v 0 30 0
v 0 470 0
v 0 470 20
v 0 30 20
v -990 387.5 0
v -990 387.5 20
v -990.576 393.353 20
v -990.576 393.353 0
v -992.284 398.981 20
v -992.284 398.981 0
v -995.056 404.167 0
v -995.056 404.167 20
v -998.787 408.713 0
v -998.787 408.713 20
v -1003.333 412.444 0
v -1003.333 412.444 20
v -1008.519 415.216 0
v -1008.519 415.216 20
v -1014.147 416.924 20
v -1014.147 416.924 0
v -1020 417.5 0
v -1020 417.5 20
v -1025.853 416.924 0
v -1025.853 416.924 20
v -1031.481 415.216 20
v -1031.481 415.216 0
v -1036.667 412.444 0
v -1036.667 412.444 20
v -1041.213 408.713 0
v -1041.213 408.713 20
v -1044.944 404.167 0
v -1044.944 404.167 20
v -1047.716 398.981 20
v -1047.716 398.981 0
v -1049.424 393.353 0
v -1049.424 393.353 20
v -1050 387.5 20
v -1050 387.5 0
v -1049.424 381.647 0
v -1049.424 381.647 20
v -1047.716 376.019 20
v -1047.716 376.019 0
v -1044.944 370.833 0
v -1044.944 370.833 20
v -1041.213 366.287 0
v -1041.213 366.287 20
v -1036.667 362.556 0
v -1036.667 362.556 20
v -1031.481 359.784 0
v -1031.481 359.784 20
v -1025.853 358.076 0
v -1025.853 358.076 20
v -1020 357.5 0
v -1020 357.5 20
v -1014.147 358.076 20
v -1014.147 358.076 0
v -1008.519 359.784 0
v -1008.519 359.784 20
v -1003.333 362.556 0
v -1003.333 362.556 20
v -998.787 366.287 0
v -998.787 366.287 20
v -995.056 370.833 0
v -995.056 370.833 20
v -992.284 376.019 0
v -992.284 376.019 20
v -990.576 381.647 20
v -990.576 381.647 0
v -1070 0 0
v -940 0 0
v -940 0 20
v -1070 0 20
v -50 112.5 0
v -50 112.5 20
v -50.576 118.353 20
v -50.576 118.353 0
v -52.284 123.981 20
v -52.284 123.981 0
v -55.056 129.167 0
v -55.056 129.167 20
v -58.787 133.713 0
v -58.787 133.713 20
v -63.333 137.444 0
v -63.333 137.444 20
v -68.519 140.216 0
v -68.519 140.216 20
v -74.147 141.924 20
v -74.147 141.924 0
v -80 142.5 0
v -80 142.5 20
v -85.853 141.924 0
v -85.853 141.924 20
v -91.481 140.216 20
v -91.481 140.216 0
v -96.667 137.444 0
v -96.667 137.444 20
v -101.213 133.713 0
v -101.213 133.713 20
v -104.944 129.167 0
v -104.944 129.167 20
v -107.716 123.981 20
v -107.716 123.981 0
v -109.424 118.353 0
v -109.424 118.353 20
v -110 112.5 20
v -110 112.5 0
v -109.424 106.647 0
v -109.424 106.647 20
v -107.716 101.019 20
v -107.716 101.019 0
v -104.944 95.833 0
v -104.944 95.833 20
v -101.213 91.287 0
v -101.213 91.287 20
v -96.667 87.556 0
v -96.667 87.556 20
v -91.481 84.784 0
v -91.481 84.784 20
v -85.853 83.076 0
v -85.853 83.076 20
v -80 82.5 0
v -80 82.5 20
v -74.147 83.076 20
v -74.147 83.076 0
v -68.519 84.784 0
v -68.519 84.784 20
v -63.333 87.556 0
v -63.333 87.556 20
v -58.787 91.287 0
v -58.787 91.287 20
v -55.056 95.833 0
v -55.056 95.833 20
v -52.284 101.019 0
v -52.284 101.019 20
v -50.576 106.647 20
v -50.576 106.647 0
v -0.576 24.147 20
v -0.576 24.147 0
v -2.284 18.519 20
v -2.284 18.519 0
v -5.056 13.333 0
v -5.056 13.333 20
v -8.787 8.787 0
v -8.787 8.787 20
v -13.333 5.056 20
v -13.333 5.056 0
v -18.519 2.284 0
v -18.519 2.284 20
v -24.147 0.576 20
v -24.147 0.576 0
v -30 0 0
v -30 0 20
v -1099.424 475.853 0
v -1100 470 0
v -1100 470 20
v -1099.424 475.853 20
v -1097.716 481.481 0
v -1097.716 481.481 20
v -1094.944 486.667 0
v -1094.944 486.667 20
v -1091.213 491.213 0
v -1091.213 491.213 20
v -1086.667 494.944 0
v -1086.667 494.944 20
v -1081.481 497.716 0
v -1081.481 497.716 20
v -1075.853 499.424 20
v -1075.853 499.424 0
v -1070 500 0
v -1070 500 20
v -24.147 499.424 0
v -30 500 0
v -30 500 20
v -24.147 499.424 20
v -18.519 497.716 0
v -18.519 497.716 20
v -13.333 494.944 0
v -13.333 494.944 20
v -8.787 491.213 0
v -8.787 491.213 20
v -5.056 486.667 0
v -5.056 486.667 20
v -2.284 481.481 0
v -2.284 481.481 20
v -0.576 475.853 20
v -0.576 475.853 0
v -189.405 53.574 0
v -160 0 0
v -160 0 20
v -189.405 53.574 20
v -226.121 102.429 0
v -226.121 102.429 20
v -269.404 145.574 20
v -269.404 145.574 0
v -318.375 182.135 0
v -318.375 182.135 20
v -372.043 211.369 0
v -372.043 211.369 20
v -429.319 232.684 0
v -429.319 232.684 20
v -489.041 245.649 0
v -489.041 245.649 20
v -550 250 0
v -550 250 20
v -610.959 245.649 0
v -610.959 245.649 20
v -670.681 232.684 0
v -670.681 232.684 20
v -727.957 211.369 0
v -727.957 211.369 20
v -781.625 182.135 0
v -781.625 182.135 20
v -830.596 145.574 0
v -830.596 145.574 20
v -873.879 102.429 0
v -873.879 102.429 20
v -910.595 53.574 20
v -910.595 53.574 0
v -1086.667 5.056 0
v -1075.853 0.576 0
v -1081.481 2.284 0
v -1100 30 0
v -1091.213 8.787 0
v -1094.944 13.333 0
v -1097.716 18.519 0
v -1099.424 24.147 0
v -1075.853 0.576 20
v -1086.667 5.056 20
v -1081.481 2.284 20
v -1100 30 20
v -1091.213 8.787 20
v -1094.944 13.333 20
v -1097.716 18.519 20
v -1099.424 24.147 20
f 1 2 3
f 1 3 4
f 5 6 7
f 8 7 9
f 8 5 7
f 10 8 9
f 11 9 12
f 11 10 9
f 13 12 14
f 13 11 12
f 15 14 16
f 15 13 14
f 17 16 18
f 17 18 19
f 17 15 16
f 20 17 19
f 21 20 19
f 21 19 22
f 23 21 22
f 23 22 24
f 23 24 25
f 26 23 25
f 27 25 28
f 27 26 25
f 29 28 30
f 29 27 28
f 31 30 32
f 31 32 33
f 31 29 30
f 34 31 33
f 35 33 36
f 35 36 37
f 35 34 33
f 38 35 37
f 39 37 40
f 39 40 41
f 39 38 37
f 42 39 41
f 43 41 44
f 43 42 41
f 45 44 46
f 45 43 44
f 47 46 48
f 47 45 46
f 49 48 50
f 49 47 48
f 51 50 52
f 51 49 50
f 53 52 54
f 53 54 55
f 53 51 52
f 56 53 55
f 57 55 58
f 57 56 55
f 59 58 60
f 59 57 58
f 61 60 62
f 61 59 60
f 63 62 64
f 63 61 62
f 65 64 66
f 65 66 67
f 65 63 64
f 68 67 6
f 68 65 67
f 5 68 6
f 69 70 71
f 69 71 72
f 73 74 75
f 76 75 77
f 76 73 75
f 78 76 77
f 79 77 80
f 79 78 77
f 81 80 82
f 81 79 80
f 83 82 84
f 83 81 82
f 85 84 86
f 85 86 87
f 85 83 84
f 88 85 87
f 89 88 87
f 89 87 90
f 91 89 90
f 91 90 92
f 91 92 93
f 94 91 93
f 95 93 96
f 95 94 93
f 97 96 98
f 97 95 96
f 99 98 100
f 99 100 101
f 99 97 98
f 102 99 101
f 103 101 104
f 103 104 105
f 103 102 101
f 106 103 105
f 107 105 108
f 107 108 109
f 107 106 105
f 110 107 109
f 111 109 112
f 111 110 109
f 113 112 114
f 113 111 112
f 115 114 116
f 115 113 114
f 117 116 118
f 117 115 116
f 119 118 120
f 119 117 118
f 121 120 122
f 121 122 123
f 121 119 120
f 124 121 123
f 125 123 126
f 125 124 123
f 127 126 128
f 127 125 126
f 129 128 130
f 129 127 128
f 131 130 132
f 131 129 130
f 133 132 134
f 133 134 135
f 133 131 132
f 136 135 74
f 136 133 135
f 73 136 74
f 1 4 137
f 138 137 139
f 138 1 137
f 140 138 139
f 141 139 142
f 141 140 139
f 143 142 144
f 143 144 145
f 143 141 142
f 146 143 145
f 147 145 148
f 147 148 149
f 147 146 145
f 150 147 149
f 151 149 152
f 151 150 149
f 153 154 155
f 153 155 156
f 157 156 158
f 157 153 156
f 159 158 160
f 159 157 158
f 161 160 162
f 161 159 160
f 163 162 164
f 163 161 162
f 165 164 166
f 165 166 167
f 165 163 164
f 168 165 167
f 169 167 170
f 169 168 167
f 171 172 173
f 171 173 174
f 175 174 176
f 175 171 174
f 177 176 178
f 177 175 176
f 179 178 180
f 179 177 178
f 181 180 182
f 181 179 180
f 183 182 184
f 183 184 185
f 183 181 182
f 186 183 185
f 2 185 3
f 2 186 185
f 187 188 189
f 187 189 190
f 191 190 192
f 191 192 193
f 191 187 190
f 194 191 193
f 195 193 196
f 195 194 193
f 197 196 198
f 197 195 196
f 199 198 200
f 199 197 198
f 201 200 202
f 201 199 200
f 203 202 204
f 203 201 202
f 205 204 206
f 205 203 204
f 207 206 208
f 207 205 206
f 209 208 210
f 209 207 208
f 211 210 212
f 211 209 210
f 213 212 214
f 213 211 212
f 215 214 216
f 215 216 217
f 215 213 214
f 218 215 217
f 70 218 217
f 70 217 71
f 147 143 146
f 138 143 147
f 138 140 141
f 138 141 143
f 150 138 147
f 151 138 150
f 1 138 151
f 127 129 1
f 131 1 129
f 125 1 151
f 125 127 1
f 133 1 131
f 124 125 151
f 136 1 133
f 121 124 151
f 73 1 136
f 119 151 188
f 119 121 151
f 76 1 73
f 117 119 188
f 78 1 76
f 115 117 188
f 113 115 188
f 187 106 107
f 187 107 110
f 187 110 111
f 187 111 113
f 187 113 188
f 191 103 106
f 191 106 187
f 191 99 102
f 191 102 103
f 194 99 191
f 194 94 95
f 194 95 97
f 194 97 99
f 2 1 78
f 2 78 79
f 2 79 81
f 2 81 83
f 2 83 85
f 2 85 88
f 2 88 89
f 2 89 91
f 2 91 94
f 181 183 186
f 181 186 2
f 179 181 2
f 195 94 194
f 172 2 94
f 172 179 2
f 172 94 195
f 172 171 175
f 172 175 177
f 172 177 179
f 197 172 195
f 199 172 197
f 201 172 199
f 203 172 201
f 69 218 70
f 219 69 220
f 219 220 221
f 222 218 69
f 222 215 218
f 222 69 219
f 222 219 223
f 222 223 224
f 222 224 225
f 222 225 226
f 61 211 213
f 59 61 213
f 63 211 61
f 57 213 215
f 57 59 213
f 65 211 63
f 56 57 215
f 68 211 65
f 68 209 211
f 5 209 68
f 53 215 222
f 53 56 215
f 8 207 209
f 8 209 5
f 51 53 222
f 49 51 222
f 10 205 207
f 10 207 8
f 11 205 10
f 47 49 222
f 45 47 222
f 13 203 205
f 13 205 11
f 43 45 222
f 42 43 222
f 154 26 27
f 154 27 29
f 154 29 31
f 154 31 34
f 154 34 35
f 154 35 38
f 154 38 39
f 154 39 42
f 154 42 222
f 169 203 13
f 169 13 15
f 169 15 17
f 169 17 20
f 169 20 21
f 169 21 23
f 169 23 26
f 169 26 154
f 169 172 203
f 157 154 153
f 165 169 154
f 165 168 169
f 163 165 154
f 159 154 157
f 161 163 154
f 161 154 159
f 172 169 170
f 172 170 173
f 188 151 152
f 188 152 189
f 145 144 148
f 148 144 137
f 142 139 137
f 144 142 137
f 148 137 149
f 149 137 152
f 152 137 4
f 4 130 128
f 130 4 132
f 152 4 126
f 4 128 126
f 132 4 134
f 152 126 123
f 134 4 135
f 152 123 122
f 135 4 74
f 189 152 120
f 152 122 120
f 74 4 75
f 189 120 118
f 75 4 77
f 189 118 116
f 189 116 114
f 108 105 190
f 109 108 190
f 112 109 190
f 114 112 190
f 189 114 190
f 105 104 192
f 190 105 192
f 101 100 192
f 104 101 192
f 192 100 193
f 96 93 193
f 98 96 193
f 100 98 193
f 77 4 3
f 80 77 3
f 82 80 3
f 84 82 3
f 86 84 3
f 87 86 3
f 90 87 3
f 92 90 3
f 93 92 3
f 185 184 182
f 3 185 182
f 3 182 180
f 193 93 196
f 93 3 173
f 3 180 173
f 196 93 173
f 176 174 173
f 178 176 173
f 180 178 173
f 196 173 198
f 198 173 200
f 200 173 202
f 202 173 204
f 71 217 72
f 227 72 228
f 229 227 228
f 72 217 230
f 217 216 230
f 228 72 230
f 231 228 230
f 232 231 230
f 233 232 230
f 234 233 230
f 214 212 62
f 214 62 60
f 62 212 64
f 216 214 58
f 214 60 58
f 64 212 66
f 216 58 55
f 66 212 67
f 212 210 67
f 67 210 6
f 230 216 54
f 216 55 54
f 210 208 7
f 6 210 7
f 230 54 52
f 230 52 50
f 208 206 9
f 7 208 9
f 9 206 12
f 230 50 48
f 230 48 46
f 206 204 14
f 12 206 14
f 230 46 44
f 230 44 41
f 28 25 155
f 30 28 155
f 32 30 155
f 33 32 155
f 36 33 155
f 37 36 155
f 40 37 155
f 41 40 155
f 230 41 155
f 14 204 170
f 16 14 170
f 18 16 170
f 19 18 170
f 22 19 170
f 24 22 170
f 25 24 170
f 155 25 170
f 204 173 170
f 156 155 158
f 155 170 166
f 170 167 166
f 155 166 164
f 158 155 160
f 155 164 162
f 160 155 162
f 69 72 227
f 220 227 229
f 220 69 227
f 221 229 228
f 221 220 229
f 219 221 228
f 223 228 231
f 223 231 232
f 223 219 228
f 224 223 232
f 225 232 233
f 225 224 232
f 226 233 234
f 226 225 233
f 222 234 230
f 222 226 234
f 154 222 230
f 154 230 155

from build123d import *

# Parameters (mm, degrees)
IZIM1_R                     = 30
Y_KSEKLIK_EKSTR_ZYON1_DEPTH = 20
KES_EKSTR_ZYON1_DEPTH       = 20


with BuildPart() as part:
    # Çizim1 → Yükseklik-Ekstrüzyon1 (new body)
    with BuildSketch(Plane.XY):
        with BuildLine():
            Line((-30, 0), (-1070, 0))
            ThreePointArc((-1070, 0), (-1091.213203436, 8.786796564), (-1100, 30))
            Line((-1100, 30), (-1100, 470))
            ThreePointArc((-1100, 470), (-1091.213203436, 491.213203436), (-1070, 500))
            Line((-1070, 500), (-30, 500))
            ThreePointArc((-30, 500), (-8.786796564, 491.213203436), (0, 470))
            Line((0, 470), (0, 30))
            ThreePointArc((0, 30), (-8.786796564, 8.786796564), (-30, 0))
        make_face()
        with Locations((-1020, 387.5)):
            Circle(IZIM1_R, mode=Mode.SUBTRACT)
        with Locations((-80, 112.5)):
            Circle(IZIM1_R, mode=Mode.SUBTRACT)
    extrude(amount=Y_KSEKLIK_EKSTR_ZYON1_DEPTH)

    # Çizim2 → Kes-Ekstrüzyon1 (cut)
    with BuildSketch(Plane(origin=(0, 0, 0), x_dir=(-1, 0, 0), z_dir=(0, 0, -1))):
        with BuildLine():
            Line((940, 0), (160, 0))
            ThreePointArc((160, 0), (550, 250), (940, 0))
        make_face()
    extrude(amount=-KES_EKSTR_ZYON1_DEPTH, mode=Mode.SUBTRACT)


solid = part.part
